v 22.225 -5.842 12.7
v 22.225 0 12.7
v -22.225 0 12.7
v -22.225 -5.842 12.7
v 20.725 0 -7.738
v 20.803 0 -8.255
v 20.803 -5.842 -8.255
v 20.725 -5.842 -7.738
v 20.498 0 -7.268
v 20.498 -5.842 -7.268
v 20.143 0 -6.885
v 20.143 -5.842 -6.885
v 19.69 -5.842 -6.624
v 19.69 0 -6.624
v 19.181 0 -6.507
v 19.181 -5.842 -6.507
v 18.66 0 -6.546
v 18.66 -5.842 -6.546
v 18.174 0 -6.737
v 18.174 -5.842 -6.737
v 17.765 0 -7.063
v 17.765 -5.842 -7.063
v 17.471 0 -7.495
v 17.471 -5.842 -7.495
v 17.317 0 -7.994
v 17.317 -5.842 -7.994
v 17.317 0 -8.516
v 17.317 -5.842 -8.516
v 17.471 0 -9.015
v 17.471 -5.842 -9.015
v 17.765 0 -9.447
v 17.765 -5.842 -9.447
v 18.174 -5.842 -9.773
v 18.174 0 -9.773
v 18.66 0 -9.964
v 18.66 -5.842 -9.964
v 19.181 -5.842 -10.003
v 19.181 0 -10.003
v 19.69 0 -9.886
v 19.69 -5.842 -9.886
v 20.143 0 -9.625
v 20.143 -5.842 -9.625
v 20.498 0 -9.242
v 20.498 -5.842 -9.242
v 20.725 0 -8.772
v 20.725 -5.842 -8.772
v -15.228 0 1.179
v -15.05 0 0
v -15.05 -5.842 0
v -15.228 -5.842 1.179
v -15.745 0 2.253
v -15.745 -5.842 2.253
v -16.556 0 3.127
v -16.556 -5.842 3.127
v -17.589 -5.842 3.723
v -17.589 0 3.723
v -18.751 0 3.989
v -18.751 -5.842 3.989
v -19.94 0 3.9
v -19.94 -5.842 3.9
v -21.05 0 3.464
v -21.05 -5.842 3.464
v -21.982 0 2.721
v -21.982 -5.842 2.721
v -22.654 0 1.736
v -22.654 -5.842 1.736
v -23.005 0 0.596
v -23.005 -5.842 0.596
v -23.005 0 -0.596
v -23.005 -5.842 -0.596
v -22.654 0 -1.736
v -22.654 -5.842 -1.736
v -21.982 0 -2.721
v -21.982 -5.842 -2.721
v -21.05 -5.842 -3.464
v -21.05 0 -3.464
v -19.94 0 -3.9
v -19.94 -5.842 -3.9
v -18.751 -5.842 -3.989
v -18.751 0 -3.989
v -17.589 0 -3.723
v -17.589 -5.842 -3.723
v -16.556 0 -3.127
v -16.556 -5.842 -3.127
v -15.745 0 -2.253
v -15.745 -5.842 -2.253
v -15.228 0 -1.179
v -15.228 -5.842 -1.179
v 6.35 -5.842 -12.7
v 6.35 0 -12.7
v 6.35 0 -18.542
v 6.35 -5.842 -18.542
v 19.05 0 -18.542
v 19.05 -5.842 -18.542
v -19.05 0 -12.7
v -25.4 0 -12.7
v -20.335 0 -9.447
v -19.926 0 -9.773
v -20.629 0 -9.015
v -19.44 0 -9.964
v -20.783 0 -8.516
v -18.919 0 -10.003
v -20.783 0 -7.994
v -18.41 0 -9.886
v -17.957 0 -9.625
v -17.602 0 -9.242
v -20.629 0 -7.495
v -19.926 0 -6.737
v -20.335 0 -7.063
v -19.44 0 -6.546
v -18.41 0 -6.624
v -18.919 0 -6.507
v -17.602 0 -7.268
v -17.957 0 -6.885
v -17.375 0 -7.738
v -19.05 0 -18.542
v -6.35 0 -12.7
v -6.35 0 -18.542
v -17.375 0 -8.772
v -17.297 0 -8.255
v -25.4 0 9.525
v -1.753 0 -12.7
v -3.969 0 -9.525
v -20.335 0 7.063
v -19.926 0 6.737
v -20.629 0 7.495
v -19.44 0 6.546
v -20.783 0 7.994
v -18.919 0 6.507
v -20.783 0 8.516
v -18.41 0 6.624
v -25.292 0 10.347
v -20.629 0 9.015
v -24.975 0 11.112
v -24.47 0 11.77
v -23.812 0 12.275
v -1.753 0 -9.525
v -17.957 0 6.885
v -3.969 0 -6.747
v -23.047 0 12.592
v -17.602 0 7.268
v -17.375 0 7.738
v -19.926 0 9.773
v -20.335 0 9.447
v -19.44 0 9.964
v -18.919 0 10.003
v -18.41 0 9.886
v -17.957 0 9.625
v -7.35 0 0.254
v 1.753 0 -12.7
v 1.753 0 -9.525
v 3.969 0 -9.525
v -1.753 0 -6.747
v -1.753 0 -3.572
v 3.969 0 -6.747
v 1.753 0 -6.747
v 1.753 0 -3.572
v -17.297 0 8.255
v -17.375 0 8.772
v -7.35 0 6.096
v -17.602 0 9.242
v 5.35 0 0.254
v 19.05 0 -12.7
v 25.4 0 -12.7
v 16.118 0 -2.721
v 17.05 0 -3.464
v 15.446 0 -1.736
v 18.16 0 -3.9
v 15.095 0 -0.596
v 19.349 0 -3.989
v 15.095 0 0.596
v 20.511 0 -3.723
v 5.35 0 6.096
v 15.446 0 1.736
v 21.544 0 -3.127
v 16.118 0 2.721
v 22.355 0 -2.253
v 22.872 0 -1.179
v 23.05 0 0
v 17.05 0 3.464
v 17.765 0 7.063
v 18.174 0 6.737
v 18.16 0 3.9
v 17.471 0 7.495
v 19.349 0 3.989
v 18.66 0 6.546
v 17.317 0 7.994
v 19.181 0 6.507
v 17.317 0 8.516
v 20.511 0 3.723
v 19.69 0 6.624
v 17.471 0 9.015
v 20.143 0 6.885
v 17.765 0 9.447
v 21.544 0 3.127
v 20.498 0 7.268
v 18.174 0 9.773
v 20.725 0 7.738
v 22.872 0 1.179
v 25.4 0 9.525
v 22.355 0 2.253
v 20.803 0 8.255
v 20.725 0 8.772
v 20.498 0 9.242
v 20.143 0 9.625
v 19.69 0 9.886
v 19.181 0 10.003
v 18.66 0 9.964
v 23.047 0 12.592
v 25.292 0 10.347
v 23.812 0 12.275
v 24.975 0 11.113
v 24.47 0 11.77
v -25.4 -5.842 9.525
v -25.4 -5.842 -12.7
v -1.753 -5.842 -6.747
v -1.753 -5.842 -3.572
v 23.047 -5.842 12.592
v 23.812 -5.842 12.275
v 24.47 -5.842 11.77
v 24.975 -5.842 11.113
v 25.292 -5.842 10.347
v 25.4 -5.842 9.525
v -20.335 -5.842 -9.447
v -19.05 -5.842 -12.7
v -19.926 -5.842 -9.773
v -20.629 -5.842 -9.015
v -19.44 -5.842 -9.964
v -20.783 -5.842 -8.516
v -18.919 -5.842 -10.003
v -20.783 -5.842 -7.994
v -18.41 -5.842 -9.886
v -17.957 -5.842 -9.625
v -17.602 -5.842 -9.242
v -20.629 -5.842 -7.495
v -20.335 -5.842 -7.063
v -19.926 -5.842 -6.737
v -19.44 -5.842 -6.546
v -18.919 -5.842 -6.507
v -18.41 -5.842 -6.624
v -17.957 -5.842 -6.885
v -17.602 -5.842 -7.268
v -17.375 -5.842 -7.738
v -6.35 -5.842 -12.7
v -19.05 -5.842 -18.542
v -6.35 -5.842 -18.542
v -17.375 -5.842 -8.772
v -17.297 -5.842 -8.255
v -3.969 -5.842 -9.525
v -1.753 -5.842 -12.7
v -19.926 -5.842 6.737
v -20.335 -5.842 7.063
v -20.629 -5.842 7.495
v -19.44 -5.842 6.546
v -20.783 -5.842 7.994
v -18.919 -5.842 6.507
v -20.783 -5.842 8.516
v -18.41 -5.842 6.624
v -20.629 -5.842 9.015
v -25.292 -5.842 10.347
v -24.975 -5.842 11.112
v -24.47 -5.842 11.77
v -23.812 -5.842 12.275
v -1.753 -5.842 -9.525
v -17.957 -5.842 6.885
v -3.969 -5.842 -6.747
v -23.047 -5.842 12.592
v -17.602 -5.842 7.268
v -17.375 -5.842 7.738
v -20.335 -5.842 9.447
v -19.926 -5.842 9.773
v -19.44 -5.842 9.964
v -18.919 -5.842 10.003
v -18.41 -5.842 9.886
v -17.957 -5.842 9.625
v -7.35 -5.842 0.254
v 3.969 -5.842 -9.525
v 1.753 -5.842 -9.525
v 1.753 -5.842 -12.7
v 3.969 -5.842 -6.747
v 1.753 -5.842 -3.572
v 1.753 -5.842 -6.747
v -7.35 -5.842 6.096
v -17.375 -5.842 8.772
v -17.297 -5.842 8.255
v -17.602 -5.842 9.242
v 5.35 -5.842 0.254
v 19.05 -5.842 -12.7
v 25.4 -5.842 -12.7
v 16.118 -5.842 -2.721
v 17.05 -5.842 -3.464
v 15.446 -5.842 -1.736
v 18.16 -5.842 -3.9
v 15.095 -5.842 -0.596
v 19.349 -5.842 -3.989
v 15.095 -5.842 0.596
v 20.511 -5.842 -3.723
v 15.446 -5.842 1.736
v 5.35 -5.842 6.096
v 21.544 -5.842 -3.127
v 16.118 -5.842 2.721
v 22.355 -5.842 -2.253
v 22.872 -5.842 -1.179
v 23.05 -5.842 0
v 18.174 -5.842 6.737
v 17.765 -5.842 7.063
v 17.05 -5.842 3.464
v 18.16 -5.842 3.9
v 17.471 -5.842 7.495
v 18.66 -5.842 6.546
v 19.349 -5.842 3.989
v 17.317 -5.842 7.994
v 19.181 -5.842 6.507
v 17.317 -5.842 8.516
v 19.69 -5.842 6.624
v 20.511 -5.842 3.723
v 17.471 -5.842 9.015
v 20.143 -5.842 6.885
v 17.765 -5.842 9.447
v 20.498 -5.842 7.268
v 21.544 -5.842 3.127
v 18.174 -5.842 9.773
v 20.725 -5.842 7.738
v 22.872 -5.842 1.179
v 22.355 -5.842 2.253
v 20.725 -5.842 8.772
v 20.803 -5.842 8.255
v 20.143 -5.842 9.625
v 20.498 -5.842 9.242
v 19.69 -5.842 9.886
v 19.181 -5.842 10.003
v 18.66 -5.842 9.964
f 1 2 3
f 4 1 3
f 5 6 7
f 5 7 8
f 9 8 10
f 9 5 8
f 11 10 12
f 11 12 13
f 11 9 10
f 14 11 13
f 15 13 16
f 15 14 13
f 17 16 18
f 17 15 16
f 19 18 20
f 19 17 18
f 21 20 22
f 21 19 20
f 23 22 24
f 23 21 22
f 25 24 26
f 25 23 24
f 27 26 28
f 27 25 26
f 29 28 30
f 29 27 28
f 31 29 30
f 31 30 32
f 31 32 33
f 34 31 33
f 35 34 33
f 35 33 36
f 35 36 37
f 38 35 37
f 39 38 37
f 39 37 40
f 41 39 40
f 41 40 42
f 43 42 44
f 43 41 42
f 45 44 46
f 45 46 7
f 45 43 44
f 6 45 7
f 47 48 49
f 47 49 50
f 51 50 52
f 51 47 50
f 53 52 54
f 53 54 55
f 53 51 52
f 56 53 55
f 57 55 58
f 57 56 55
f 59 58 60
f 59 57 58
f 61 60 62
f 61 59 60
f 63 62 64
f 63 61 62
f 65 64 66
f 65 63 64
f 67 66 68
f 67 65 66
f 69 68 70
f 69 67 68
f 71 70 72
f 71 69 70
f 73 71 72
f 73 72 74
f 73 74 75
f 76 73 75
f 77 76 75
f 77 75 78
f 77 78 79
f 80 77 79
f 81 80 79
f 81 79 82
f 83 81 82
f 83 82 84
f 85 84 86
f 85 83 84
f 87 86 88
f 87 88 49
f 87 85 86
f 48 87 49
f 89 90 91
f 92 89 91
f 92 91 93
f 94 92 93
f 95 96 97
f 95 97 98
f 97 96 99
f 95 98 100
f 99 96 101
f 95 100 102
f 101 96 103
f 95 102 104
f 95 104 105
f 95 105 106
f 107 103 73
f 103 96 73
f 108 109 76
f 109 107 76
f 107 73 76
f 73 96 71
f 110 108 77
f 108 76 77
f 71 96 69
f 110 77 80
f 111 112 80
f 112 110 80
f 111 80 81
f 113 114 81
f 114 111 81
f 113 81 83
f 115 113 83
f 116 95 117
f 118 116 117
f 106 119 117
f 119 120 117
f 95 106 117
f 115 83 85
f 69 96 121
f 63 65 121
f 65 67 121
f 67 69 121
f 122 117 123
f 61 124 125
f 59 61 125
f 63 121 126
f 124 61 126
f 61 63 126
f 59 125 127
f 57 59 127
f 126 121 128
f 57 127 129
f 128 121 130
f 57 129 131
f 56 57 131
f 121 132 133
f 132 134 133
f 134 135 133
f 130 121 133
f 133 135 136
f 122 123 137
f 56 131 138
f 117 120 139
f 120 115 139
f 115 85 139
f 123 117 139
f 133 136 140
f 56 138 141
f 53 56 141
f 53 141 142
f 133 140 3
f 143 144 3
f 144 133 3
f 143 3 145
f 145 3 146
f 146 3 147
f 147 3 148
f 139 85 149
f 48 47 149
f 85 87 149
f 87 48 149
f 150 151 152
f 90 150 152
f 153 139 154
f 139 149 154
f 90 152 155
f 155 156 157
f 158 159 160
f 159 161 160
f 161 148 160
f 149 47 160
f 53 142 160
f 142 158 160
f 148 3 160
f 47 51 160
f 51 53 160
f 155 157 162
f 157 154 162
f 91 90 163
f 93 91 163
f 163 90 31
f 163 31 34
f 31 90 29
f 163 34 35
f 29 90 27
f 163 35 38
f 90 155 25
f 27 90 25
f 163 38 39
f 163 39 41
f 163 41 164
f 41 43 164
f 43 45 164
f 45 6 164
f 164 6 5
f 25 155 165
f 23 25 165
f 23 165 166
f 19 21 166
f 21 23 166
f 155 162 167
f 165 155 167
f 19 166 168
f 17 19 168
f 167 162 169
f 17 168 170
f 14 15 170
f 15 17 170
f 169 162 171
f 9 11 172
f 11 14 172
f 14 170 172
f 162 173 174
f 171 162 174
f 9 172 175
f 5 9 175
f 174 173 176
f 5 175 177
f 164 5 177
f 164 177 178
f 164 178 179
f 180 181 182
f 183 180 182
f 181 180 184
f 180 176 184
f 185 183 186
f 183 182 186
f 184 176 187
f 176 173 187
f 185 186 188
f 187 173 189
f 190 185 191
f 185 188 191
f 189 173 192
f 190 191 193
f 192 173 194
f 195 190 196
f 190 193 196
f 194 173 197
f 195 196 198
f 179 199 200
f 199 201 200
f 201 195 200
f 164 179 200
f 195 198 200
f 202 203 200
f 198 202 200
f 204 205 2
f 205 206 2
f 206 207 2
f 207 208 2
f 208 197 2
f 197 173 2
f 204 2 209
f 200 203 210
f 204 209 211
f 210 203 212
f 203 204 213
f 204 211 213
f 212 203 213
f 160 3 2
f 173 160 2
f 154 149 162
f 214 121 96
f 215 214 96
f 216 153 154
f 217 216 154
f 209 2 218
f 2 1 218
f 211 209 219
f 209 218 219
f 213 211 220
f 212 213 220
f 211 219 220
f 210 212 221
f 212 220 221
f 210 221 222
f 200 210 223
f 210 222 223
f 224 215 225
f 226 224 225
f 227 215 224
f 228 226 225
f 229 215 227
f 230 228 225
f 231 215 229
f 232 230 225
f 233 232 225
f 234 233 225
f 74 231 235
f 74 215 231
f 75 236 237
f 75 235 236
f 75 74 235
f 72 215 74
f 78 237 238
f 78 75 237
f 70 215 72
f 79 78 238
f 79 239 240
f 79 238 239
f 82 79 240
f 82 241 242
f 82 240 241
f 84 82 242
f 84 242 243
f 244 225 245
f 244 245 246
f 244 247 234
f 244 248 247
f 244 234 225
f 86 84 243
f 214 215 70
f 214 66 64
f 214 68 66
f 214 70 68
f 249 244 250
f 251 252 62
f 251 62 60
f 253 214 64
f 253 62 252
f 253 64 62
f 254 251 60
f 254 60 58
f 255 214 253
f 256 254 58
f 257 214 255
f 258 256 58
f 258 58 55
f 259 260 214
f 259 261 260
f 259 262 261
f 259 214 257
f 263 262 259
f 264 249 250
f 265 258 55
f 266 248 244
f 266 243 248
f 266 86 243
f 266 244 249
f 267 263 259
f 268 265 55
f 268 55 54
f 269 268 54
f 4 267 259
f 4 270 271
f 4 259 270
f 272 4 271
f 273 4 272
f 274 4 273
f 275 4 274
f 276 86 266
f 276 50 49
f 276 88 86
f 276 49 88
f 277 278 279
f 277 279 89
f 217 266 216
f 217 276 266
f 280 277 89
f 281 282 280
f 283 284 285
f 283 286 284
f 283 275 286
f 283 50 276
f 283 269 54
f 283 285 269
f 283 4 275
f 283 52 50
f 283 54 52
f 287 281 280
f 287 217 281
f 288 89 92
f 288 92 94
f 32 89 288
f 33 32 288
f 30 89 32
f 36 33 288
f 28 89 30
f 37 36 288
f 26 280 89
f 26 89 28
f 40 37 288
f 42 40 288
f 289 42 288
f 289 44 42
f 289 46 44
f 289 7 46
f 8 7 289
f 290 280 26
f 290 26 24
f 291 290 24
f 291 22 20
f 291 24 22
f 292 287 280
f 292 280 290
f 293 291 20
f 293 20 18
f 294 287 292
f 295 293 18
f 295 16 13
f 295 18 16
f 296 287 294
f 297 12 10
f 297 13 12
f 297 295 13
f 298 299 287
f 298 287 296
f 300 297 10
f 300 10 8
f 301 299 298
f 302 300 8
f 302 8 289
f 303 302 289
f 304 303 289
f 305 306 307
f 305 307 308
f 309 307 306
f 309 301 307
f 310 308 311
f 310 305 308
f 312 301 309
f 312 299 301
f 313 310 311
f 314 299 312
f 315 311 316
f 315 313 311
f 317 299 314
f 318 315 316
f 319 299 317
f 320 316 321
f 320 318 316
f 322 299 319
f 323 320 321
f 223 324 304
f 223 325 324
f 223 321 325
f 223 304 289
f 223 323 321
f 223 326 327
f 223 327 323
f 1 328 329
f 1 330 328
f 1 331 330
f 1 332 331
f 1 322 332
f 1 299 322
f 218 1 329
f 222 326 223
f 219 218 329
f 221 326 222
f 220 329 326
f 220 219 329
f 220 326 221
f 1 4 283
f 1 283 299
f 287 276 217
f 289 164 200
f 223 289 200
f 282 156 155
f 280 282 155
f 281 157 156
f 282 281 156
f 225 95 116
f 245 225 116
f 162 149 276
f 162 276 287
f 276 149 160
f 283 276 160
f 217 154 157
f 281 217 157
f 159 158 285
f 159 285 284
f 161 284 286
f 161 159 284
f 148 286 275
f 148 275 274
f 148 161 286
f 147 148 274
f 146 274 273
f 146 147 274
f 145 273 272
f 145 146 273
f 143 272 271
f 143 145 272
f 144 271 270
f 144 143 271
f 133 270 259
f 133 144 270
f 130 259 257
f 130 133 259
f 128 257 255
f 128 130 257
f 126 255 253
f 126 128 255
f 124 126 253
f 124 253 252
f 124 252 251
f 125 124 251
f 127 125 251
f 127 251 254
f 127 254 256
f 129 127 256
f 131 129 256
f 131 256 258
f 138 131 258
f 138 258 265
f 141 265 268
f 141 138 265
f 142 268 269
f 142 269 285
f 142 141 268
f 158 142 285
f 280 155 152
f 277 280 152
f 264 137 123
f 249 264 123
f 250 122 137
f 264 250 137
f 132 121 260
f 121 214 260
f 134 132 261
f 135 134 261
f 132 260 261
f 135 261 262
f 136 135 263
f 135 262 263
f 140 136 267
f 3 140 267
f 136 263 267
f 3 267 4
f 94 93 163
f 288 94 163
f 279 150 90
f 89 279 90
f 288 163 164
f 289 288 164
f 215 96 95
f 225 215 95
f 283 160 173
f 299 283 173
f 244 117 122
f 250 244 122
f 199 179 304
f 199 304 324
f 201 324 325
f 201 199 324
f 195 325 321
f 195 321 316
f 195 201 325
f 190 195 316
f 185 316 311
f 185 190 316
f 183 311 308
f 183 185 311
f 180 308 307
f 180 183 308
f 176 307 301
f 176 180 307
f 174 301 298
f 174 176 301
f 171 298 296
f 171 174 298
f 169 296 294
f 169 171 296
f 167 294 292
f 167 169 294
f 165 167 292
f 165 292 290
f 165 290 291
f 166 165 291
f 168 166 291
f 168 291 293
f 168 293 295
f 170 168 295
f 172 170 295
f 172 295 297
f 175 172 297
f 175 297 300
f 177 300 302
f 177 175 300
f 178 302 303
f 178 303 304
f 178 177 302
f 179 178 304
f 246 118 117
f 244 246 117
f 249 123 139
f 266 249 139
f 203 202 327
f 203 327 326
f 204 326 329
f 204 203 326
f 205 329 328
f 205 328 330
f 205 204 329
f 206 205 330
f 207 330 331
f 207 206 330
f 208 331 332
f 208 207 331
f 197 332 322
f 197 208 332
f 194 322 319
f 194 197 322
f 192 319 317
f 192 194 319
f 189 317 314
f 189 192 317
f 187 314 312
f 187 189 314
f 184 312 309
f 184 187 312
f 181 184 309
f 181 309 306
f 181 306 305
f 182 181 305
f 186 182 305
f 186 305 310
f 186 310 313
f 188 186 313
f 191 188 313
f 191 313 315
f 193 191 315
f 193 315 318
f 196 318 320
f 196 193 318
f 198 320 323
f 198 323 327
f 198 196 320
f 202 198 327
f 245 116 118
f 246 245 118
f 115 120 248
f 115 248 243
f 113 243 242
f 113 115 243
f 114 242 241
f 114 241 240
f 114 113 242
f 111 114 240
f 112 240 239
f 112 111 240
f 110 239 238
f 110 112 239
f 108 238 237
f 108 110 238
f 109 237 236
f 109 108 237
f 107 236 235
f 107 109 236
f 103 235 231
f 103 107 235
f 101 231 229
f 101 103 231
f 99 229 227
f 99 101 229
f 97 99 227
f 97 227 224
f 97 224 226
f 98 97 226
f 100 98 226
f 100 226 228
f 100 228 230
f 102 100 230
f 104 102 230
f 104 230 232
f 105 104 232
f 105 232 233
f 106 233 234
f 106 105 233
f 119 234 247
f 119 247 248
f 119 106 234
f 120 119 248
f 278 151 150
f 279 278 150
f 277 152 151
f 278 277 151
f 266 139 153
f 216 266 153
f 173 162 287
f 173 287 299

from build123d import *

# Parameters (mm, degrees)
F0_R     = 1.7526
F0_R_2   = 4
F0_W     = 12.7
F0_H     = 5.842
F1_DEPTH = 5.842
F2_R     = 3.175


# Not quite as in the source:
# - a feature names something its author has since deleted; it is built from what else it names


with BuildPart() as f1:
    # F0 (on Front) → F1 (new body)
    with BuildSketch(Plane.XZ):
        Polygon((-12.7, 12.7), (-25.4, 12.7), (-25.4, -12.7), (-19.05, -12.7), (-19.05, -18.542), (-6.35, -18.542), (-6.35, -12.7), (-1.7526, -12.7), (-1.7526, -9.525), (-3.96875, -9.525), (-3.96875, -6.746875), (-1.7526, -6.746875), (-1.7526, -3.571875), (1.7526, -3.571875), (1.7526, -6.746875), (3.96875, -6.746875), (3.96875, -9.525), (1.7526, -9.525), (1.7526, -12.7), (6.35, -12.7), (6.35, -18.542), (19.05, -18.542), (19.05, -12.7), (25.4, -12.7), (25.4, 12.7), (12.7, 12.7), align=None)
        with Locations((-19.05, -8.255)):
            Circle(F0_R, mode=Mode.SUBTRACT)
        with Locations((19.05, -8.255)):
            Circle(F0_R, mode=Mode.SUBTRACT)
        with Locations((-19.05, 0)):
            Circle(F0_R_2, mode=Mode.SUBTRACT)
        with Locations((-1, 3.175)):
            Rectangle(F0_W, F0_H, mode=Mode.SUBTRACT)
        with Locations((-19.05, 8.255)):
            Circle(F0_R, mode=Mode.SUBTRACT)
        with Locations((19.05, 0)):
            Circle(F0_R_2, mode=Mode.SUBTRACT)
        with Locations((19.05, 8.255)):
            Circle(F0_R, mode=Mode.SUBTRACT)
    extrude(amount=F1_DEPTH)

    # F2
    f2_edges = [f1.edges().sort_by_distance(p)[0] for p in [
        (-25.4, -2.921, 12.7),
        (25.4, -2.921, 12.7),
    ]]
    fillet(f2_edges, radius=F2_R)


solid = f1.part
